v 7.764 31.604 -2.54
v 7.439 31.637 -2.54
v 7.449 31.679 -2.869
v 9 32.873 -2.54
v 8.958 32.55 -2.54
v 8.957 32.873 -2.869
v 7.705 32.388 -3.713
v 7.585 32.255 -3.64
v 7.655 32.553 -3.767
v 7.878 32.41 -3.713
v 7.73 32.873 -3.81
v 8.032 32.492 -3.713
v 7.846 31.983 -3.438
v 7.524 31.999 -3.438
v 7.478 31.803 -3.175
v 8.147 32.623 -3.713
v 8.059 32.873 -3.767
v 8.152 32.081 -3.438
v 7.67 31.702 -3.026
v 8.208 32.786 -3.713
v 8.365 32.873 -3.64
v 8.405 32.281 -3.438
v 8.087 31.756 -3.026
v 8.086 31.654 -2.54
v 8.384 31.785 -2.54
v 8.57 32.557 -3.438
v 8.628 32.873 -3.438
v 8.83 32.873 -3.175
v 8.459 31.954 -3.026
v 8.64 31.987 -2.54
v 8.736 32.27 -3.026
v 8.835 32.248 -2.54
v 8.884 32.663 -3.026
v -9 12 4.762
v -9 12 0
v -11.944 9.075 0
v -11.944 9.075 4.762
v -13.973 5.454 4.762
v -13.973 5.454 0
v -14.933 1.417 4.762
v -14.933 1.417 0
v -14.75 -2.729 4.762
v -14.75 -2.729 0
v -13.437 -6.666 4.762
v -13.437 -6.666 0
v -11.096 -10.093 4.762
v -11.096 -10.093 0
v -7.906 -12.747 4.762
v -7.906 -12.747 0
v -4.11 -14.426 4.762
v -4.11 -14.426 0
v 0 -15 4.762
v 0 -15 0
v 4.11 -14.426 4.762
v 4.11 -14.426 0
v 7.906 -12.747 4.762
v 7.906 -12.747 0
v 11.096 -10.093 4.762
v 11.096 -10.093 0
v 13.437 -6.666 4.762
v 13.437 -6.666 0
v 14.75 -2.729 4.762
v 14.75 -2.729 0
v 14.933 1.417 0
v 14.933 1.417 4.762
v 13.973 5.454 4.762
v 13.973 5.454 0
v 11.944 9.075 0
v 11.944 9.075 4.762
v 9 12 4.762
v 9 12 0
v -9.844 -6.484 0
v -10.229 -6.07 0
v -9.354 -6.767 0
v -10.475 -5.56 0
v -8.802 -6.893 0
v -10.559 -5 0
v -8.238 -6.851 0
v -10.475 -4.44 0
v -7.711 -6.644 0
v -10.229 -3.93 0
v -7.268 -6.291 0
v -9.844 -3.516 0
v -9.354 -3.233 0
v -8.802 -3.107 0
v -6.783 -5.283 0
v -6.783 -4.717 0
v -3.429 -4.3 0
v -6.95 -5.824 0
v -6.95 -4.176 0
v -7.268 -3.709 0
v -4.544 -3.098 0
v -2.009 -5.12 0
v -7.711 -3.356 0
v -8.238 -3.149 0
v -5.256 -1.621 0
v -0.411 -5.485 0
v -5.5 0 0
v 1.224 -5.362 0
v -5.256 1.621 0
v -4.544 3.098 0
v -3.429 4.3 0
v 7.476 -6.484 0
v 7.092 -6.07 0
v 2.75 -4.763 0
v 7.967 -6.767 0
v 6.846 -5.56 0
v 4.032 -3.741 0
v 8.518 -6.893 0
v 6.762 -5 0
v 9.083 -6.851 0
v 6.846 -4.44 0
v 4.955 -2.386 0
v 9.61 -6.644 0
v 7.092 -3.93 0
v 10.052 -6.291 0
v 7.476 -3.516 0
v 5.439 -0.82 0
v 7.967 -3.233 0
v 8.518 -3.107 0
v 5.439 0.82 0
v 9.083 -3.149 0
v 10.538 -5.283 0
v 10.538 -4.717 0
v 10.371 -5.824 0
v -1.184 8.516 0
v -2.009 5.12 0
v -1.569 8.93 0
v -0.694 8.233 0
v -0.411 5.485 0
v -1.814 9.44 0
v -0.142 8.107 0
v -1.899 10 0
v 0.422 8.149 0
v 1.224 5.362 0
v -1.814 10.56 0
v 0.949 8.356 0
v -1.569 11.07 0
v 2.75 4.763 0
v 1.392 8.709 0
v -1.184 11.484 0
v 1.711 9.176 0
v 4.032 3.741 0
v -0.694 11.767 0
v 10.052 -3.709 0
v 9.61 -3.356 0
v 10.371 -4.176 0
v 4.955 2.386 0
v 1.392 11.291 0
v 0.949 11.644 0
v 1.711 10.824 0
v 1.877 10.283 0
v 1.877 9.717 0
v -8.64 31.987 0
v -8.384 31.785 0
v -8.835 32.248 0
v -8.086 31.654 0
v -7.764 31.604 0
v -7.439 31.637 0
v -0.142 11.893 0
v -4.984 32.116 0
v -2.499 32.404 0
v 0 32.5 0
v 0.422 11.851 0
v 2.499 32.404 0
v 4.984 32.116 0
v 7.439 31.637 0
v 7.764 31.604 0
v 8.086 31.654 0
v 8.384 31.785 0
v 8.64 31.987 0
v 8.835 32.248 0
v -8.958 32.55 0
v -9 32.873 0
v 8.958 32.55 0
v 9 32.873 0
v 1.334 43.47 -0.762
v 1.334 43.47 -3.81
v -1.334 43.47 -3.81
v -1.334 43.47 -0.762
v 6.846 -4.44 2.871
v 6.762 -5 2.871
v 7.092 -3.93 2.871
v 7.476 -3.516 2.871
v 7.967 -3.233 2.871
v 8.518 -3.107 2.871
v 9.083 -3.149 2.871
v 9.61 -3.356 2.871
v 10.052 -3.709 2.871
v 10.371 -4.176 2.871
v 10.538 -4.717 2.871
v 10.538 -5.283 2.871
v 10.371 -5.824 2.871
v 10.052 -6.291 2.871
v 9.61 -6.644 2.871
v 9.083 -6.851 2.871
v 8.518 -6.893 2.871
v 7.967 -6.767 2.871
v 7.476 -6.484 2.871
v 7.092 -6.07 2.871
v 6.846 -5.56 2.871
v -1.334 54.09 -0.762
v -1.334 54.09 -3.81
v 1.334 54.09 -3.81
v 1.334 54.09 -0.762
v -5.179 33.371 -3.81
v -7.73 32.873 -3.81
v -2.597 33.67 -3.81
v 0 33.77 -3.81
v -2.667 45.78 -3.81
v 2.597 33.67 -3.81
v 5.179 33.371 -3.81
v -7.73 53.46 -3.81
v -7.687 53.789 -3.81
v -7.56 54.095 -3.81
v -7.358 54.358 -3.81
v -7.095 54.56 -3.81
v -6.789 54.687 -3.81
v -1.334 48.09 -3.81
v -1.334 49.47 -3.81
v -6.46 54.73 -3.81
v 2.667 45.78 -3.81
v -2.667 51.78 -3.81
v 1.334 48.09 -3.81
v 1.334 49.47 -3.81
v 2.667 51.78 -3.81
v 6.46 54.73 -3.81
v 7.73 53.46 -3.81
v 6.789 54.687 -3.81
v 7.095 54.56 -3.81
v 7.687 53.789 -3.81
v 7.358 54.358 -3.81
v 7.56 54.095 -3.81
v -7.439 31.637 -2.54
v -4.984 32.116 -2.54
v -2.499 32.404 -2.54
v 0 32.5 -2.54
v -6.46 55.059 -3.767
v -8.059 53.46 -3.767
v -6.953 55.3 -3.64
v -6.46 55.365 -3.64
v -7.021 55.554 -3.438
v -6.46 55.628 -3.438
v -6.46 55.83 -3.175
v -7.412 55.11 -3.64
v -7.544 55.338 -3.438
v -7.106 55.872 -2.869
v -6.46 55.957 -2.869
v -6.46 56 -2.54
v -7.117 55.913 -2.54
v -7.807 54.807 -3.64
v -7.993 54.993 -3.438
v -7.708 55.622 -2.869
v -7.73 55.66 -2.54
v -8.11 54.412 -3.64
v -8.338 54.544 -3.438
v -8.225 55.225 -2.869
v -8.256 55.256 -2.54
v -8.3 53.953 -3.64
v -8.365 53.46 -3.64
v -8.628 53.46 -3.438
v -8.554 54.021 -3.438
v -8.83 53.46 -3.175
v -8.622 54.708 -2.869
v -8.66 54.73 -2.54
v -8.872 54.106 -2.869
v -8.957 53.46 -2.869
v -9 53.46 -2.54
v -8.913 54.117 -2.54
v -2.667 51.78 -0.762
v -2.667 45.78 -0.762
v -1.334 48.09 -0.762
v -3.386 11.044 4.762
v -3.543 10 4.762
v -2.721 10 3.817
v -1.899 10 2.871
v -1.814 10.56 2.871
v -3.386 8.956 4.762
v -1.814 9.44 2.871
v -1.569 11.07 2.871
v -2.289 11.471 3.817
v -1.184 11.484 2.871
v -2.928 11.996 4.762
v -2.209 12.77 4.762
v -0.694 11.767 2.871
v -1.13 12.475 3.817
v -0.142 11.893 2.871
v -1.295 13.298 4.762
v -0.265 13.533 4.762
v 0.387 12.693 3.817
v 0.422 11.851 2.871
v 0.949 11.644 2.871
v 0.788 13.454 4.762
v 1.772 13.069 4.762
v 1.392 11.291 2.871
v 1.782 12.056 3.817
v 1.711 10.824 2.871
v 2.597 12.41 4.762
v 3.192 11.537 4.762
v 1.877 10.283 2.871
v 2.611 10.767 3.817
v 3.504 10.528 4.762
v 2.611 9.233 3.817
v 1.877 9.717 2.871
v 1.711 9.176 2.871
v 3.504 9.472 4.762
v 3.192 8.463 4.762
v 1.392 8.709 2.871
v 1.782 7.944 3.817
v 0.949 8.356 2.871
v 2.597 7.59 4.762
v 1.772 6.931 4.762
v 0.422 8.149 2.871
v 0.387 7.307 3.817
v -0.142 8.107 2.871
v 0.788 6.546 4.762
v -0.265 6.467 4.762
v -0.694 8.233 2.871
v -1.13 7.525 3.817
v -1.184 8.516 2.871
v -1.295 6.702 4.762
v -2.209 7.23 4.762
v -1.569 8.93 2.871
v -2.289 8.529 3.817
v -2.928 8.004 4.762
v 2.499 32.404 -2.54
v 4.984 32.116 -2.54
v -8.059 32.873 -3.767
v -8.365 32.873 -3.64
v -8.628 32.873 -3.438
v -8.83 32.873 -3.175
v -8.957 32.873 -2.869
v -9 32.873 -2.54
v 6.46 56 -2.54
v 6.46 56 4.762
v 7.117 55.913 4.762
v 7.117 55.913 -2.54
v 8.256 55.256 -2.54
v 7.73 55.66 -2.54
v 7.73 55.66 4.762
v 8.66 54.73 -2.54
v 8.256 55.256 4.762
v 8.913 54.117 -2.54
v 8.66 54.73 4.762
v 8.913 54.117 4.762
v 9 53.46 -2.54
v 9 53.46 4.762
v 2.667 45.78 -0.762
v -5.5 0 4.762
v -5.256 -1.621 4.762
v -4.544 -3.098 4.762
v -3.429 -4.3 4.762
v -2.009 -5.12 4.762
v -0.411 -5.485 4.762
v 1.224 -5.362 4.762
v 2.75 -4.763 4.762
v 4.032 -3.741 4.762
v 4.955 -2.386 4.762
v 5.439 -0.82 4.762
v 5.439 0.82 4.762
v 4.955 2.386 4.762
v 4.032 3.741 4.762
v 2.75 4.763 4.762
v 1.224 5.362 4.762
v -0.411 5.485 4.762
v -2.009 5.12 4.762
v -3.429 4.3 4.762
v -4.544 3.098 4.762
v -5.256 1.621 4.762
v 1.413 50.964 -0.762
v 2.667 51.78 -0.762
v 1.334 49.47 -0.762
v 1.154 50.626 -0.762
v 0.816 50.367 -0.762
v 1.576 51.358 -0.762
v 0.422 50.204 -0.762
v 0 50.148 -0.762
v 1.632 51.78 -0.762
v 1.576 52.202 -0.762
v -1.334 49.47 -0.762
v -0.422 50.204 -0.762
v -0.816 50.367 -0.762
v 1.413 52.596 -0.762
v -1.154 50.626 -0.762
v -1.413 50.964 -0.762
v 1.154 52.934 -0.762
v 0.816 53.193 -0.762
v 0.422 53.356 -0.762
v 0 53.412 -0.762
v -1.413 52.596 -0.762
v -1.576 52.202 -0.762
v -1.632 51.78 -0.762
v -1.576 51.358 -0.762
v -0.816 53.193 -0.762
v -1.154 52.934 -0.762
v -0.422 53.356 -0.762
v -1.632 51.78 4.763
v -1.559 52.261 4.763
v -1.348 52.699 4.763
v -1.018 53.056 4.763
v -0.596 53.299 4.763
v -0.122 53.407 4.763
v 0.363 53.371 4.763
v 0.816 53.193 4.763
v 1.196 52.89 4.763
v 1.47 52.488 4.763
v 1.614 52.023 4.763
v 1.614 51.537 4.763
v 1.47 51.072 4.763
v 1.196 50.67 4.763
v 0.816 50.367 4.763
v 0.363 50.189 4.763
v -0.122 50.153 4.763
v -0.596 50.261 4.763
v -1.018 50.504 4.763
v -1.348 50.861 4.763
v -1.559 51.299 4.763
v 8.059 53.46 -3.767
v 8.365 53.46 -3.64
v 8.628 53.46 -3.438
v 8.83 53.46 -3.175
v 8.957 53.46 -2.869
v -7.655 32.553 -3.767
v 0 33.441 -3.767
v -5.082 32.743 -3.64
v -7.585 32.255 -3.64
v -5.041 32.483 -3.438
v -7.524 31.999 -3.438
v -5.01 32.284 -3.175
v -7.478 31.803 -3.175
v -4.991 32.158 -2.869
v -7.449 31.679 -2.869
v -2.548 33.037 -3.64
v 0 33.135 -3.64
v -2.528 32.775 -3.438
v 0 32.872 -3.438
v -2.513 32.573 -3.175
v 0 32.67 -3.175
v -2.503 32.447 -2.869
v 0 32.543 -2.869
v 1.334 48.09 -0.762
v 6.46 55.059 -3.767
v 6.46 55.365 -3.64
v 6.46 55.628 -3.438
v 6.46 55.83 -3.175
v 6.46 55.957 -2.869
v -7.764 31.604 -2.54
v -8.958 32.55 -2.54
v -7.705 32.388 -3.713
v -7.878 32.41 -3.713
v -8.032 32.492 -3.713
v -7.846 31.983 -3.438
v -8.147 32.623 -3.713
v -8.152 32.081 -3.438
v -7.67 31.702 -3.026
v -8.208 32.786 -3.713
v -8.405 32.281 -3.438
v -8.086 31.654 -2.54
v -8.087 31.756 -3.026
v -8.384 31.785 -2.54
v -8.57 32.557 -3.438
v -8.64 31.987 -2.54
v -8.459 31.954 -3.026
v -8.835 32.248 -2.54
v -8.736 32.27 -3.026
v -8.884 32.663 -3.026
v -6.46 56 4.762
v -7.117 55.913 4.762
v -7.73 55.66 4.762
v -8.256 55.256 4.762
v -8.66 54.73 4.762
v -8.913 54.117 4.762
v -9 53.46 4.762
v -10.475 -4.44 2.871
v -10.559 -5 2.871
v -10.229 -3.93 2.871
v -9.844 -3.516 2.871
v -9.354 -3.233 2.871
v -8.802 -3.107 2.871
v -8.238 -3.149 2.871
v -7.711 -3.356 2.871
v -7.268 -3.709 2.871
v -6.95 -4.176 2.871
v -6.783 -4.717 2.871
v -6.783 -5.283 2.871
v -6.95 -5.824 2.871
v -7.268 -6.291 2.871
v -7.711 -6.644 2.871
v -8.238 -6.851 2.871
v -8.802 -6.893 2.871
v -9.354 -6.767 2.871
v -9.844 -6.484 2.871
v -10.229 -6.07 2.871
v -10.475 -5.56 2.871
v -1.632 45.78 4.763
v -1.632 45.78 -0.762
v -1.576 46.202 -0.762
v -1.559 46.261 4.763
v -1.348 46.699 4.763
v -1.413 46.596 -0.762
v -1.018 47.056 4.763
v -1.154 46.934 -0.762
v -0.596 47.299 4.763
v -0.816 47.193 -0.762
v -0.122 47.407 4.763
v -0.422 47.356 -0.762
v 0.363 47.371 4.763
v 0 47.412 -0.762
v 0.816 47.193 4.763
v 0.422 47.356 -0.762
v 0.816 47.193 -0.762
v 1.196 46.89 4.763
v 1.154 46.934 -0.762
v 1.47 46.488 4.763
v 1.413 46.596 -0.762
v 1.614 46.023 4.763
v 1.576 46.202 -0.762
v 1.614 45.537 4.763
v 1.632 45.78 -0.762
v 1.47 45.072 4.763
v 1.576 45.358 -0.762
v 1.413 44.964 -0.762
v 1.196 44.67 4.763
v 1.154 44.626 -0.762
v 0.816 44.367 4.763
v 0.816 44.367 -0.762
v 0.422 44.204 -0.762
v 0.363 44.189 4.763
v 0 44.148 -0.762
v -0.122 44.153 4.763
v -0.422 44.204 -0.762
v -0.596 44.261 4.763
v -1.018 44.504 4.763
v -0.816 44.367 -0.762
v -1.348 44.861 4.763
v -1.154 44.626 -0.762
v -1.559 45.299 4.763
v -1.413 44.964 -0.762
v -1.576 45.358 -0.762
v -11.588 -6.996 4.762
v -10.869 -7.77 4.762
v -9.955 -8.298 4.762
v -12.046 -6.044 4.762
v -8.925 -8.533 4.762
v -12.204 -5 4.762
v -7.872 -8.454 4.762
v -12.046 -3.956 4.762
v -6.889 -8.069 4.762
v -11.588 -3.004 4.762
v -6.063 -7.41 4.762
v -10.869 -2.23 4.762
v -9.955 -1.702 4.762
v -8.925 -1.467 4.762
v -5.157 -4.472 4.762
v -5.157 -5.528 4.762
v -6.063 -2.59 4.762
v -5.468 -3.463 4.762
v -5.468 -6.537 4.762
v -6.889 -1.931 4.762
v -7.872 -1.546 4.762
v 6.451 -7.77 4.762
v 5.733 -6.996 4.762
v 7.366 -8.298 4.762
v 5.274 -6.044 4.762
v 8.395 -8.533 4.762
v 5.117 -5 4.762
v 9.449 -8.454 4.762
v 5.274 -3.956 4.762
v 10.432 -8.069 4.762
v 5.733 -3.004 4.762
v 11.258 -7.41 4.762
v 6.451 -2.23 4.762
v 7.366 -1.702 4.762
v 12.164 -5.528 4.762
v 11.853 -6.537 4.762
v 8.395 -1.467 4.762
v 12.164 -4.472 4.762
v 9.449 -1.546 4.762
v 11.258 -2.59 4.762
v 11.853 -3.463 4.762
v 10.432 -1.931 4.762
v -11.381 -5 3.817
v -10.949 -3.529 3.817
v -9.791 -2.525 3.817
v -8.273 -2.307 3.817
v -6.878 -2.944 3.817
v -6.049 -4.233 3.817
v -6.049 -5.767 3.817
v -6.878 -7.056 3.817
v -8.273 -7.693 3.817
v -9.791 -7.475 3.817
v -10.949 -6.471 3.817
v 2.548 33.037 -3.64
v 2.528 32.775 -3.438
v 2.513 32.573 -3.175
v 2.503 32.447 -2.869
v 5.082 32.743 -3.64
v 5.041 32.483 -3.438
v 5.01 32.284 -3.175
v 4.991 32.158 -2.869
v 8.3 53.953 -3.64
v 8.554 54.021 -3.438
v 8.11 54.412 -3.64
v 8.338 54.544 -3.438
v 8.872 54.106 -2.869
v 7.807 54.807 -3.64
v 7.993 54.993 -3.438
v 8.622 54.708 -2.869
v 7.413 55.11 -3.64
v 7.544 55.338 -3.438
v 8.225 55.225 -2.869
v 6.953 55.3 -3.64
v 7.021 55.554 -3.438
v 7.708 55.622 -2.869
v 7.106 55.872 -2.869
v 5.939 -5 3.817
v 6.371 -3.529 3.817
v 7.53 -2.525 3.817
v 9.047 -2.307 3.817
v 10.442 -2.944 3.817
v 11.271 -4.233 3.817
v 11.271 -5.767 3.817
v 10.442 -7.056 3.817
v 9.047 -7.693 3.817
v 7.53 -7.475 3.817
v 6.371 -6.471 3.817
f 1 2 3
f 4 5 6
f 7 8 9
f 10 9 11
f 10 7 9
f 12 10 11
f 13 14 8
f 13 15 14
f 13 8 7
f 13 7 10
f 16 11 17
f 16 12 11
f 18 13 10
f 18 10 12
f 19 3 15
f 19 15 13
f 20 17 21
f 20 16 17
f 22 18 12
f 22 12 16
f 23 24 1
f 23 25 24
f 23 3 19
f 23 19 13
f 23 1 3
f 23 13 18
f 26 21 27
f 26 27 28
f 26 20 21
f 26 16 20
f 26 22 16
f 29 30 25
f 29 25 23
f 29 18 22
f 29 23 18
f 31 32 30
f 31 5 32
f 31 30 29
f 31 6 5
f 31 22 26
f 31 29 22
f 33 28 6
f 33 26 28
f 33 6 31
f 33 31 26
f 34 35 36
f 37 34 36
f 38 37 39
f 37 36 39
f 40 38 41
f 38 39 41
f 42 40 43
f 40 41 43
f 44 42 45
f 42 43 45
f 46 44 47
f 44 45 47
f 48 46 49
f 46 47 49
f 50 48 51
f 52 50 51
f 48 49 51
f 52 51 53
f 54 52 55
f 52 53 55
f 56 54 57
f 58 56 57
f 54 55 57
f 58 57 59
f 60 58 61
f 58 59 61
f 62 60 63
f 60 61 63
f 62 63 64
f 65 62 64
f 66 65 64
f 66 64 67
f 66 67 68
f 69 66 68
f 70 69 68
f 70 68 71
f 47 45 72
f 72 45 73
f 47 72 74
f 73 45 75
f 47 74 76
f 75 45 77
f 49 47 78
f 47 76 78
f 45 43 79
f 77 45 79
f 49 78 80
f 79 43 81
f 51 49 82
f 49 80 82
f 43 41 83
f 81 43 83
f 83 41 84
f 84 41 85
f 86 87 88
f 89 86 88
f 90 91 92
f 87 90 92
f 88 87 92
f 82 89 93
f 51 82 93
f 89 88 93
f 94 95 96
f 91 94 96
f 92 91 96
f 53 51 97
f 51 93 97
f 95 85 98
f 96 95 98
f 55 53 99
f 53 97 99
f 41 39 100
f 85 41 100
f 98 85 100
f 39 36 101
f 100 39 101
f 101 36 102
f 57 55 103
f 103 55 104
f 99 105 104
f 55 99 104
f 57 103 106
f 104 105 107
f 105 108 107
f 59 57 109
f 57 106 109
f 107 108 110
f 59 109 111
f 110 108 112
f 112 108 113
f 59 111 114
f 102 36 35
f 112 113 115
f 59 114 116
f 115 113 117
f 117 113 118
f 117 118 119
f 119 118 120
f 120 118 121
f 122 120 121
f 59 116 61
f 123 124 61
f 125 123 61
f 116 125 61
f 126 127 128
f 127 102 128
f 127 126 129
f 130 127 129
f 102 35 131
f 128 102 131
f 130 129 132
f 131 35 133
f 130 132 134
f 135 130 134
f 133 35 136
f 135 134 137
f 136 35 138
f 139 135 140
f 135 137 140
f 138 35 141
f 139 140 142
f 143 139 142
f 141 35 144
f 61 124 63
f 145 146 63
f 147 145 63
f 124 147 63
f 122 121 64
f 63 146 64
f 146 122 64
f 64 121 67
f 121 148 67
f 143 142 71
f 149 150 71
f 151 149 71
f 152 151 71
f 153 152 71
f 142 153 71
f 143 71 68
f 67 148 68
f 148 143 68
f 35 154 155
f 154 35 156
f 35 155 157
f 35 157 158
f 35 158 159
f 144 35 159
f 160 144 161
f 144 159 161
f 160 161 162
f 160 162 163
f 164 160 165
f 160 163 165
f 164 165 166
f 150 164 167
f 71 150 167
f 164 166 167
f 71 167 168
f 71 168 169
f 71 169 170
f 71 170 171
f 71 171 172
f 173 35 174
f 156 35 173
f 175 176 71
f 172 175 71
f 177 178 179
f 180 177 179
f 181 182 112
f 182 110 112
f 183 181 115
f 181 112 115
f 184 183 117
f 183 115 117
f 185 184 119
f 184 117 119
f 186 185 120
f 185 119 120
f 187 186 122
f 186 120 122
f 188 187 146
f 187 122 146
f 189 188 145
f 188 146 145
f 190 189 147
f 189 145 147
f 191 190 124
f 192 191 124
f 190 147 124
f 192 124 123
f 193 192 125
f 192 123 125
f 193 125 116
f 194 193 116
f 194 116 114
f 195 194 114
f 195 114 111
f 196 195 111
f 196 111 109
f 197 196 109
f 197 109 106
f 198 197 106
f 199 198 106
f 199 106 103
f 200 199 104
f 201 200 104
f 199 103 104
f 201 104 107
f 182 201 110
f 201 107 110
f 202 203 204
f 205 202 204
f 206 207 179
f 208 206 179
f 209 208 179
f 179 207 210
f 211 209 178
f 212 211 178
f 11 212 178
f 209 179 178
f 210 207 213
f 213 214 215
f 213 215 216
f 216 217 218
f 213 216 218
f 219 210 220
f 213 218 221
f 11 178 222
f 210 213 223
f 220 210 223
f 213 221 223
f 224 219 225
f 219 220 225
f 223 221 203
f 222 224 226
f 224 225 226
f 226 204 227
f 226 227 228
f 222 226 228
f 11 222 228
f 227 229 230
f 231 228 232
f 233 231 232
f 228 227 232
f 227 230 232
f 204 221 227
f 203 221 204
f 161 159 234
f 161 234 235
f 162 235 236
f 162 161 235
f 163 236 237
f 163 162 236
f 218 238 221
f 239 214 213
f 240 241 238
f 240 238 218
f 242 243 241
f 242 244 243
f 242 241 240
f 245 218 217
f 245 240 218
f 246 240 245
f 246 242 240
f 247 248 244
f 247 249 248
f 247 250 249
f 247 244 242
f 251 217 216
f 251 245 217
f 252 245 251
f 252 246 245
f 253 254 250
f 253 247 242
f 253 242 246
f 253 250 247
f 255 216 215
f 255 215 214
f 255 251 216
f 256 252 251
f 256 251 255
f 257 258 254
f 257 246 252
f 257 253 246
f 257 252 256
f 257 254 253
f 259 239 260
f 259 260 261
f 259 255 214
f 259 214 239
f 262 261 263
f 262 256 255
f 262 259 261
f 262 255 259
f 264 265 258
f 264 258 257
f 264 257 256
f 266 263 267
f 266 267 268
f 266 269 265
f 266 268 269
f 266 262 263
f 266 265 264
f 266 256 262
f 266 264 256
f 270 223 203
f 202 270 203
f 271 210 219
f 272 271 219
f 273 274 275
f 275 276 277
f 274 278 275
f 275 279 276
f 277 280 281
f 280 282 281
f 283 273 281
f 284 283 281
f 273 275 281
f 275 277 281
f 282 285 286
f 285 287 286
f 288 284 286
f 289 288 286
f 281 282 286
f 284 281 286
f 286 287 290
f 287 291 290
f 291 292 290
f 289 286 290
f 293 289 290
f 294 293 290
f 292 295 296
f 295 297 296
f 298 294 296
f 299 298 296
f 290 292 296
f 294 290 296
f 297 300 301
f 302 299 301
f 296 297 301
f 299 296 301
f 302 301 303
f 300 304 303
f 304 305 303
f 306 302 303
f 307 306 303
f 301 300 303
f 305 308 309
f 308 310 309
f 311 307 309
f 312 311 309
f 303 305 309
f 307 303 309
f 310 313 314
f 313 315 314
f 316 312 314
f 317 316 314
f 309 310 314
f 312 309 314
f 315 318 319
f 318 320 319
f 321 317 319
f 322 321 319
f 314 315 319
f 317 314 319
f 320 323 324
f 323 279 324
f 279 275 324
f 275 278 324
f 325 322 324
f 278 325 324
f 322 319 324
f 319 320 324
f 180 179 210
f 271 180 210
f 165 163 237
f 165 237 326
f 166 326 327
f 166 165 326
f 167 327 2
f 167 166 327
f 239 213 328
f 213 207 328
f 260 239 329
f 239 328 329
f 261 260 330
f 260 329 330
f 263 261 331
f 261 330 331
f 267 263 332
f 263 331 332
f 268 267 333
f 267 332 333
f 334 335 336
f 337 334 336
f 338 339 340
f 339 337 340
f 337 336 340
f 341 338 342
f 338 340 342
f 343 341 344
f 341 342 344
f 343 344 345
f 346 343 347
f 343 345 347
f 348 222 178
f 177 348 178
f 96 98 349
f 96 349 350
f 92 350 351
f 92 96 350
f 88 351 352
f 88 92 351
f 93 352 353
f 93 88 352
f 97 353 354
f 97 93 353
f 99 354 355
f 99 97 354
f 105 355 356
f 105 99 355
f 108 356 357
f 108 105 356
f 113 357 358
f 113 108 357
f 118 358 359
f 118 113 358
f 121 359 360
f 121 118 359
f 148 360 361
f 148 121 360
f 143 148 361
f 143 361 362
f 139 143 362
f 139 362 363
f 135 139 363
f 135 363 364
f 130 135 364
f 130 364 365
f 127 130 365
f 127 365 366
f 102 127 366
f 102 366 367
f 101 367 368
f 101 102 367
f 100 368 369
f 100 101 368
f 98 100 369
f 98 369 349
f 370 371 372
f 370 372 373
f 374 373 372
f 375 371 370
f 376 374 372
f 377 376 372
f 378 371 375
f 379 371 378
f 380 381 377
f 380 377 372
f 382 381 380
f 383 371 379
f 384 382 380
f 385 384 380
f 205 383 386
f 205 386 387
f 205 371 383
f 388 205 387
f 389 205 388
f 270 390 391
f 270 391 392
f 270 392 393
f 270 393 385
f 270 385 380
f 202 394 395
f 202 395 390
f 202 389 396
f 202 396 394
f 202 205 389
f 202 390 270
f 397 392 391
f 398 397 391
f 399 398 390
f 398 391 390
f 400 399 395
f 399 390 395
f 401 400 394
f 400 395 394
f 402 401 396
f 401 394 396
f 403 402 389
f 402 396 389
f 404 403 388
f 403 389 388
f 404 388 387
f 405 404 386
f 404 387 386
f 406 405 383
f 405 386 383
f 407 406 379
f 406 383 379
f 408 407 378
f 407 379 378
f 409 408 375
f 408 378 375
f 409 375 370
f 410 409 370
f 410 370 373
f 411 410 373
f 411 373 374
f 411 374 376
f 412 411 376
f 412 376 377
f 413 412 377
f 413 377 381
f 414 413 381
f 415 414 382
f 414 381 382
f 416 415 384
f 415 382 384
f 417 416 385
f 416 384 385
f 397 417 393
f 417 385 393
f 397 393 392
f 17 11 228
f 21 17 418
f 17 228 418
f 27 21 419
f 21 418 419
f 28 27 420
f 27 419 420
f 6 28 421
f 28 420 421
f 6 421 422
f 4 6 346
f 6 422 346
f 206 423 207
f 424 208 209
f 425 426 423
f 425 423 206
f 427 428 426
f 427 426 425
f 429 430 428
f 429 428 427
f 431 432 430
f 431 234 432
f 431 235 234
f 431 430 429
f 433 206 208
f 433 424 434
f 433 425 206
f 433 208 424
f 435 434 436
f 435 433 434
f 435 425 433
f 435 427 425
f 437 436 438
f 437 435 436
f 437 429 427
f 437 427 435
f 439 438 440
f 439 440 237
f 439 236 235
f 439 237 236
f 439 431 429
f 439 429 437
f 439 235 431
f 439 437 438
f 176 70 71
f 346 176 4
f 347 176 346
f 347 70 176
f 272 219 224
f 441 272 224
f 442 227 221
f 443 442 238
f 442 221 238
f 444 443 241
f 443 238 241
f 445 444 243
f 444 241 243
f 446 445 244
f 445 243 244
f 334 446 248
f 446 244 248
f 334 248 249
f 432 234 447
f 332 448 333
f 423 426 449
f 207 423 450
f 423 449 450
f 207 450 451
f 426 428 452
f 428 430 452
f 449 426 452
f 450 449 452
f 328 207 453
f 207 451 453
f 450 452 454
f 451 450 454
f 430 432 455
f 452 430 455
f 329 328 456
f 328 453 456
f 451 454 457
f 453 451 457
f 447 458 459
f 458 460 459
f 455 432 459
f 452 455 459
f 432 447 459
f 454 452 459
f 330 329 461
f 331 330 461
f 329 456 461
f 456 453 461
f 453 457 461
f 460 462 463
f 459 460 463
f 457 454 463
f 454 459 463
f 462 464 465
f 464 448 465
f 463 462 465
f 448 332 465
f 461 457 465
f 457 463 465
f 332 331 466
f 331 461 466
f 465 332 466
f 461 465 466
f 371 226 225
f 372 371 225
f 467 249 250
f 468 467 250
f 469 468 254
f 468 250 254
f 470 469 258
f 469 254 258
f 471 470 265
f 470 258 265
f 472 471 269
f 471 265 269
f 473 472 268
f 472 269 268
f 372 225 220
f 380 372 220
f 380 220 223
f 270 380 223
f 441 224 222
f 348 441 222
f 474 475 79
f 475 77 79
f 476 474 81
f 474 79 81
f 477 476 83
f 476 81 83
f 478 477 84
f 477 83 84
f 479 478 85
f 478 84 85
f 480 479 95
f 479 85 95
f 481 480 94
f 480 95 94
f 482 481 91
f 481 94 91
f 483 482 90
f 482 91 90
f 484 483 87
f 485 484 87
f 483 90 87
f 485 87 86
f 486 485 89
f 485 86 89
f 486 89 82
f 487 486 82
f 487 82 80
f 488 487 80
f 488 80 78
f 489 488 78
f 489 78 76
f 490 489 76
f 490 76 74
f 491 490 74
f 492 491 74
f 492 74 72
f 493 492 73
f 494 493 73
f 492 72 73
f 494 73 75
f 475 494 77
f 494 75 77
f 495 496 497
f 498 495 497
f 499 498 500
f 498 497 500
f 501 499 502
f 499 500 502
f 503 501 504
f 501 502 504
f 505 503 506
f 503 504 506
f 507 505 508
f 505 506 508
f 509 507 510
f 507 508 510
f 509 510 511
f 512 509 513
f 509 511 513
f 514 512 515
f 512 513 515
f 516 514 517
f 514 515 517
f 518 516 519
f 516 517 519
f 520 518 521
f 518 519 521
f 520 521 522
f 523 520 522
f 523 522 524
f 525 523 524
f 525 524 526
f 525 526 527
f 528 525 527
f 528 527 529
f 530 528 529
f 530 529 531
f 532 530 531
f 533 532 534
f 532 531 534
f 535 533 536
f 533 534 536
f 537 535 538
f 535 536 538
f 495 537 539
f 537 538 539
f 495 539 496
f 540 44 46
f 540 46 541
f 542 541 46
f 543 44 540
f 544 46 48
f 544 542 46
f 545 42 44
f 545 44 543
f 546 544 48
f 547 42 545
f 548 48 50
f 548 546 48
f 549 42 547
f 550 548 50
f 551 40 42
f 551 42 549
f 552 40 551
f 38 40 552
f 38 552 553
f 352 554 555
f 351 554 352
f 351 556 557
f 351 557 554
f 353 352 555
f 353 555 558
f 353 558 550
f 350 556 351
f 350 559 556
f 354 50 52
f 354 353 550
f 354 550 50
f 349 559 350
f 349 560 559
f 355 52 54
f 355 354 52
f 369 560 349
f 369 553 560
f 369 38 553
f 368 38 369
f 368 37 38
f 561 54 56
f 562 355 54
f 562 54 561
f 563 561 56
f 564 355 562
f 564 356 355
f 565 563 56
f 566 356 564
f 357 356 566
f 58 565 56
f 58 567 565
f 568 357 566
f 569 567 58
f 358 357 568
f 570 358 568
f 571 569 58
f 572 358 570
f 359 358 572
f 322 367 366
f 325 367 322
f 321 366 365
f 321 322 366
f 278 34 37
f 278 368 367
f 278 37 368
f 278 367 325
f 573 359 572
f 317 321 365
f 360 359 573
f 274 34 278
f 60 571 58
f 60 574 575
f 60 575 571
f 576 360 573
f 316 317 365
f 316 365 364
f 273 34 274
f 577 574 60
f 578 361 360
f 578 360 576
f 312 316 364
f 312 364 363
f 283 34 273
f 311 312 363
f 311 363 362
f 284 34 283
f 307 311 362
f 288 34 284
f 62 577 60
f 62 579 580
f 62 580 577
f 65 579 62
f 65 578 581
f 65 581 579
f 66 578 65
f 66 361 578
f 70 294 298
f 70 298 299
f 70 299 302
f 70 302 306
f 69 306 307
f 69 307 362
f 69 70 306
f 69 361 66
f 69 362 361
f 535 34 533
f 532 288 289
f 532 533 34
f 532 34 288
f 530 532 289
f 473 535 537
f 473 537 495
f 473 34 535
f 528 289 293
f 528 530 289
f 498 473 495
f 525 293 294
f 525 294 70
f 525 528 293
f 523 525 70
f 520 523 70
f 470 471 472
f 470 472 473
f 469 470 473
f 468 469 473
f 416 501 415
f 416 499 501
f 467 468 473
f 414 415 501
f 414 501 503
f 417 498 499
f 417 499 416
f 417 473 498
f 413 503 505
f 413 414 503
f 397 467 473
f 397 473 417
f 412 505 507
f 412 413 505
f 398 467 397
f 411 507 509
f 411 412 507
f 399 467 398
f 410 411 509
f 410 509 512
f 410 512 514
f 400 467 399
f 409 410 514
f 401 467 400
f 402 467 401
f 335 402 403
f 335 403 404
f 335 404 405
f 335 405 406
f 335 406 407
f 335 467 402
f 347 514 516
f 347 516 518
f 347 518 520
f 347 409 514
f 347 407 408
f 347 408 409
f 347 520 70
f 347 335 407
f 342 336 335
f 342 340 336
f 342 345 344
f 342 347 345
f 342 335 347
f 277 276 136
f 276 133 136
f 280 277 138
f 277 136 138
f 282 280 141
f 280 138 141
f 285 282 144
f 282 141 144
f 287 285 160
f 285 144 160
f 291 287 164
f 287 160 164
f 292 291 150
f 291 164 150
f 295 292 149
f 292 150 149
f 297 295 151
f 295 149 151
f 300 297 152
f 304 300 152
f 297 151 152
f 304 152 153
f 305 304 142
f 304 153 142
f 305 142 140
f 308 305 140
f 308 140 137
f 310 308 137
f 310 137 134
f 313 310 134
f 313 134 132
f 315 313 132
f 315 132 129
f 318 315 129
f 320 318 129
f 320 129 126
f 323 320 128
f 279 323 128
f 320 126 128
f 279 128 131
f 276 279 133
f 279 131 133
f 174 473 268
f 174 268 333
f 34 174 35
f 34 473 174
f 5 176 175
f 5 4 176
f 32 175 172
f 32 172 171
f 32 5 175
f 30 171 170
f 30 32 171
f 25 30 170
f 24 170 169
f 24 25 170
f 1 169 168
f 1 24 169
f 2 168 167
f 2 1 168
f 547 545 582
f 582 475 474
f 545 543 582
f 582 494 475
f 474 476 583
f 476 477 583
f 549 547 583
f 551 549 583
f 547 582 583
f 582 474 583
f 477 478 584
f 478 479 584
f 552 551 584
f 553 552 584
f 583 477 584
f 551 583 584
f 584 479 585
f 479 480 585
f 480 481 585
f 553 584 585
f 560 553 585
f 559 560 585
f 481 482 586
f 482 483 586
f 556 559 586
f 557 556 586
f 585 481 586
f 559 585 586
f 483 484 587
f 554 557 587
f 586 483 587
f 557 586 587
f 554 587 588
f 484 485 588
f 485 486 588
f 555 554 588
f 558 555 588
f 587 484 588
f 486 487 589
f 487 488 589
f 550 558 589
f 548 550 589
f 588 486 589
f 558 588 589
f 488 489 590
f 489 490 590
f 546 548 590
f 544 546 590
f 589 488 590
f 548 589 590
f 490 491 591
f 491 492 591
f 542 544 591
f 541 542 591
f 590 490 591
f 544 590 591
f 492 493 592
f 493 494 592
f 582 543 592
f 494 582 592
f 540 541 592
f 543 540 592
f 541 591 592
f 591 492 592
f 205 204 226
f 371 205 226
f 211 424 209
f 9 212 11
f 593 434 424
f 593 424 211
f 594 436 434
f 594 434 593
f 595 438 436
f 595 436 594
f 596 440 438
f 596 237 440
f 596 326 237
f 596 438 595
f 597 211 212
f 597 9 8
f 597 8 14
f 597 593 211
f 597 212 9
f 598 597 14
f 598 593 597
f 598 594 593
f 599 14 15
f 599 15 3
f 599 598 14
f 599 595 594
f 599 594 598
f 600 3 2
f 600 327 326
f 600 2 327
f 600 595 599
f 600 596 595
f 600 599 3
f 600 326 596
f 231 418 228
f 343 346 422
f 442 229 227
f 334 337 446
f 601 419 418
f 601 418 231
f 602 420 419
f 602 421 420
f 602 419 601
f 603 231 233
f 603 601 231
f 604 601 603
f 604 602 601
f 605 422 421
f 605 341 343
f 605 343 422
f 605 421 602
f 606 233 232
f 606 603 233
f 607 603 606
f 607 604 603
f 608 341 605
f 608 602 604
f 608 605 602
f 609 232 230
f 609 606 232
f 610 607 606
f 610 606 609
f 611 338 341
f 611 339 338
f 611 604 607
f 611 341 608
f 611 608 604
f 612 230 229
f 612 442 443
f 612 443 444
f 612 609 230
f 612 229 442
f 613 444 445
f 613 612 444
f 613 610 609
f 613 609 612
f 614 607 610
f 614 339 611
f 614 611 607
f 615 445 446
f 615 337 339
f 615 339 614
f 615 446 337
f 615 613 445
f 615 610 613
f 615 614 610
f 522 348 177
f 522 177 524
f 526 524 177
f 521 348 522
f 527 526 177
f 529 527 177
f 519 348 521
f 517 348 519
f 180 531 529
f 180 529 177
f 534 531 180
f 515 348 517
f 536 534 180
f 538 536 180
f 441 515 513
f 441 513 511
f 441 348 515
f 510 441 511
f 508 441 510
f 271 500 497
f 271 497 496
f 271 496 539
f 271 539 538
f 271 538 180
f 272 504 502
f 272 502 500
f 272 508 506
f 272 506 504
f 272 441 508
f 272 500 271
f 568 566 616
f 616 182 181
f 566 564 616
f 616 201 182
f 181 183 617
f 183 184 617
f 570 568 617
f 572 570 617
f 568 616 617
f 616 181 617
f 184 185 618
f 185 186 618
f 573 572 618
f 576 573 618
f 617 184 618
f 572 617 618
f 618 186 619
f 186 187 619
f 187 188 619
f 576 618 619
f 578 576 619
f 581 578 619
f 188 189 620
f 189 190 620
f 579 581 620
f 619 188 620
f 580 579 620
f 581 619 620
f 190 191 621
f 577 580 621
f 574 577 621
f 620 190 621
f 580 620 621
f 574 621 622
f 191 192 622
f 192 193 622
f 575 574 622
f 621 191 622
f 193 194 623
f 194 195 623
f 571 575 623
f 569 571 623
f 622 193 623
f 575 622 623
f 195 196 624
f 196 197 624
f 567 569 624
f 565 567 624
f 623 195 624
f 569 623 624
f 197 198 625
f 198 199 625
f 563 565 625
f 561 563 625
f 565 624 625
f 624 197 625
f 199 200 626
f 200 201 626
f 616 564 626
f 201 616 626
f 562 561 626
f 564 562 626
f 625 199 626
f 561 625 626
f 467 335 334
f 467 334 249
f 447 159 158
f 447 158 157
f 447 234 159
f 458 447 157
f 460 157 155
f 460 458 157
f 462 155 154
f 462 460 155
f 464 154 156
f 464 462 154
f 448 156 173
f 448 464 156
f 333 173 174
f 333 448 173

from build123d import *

# Parameters (mm, degrees)
SKETCH1_R                                      = 5.5
BODY_DEPTH                                     = 4.7625
HEX_NUTYFOOT_DEPTH                             = 3.81
F_4_CLEARANCE_HOLE1_D                          = 3.2639
SKETCH7_R                                      = 1.63195
HEX_NUT_RECESS_DEPTH                           = 3.048
CSK_FOR_6_FLAT_HEAD_MACHINE_SCREW1_D           = 3.7973
CSK_FOR_6_FLAT_HEAD_MACHINE_SCREW1_CSINK_D     = 7.0866
CSK_FOR_6_FLAT_HEAD_MACHINE_SCREW1_CSINK_ANGLE = 82
FILLET1_R                                      = 2.54
FILLET2_R                                      = 1.27


with BuildPart() as part:
    # Sketch1 → Body (new body)
    with BuildSketch(Plane.XY):
        with BuildLine():
            ThreePointArc((-9, 12), (0, -15), (9, 12))
            Line((9, 12), (9, 56))
            Line((9, 56), (-9, 56))
            Line((-9, 56), (-9, 12))
        make_face()
        Circle(SKETCH1_R, mode=Mode.SUBTRACT)
    extrude(amount=BODY_DEPTH)

    # Sketch1<3> → Hex NutyFoot (add)
    with BuildSketch(Plane.XY):
        with BuildLine():
            ThreePointArc((-9, 31.228992939), (0, 32.5), (9, 31.228992939))
            Line((9, 31.228992939), (9, 56))
            Line((9, 56), (-9, 56))
            Line((-9, 56), (-9, 31.228992939))
        make_face()
    extrude(amount=-HEX_NUTYFOOT_DEPTH)

    # #4 Clearance Hole1 (through all)
    with Locations(Plane(origin=(0, 45.78, 4.7625), x_dir=(1, 0, 0), z_dir=(0, 0, 1))):
        with Locations((0, 0), (0, 6)):
            Hole(F_4_CLEARANCE_HOLE1_D / 2)

    # Sketch7 → Hex Nut Recess (cut)
    # profile 1 of 2: a face of its own
    with BuildSketch(Plane(origin=(0, 0, -3.81), x_dir=(-1, 0, 0), z_dir=(0, 0, -1))):
        Polygon((2.667, 45.78), (1.3335, 48.089689752), (-1.3335, 48.089689752), (-2.667, 45.78), (-1.3335, 43.470310248), (1.3335, 43.470310248), align=None)
        with Locations((0, 45.78)):
            Circle(SKETCH7_R, mode=Mode.SUBTRACT)
    # profile 2 of 2: a face of its own
    with BuildSketch(Plane(origin=(0, 0, -3.81), x_dir=(-1, 0, 0), z_dir=(0, 0, -1))):
        Polygon((2.667, 51.78), (1.3335, 54.089689752), (-1.3335, 54.089689752), (-2.667, 51.78), (-1.3335, 49.470310248), (1.3335, 49.470310248), align=None)
        with Locations((0, 51.78)):
            Circle(SKETCH7_R, mode=Mode.SUBTRACT)
    extrude(amount=-HEX_NUT_RECESS_DEPTH, mode=Mode.SUBTRACT)

    # CSK for #6 Flat Head Machine Screw1 (through all)
    with Locations(Plane(origin=(0, 10, 4.7625), x_dir=(1, 0, 0), z_dir=(0, 0, 1))):
        with Locations((0, 0), (8.660254038, -15), (-8.660254038, -15)):
            CounterSinkHole(CSK_FOR_6_FLAT_HEAD_MACHINE_SCREW1_D / 2, CSK_FOR_6_FLAT_HEAD_MACHINE_SCREW1_CSINK_D / 2, counter_sink_angle=CSK_FOR_6_FLAT_HEAD_MACHINE_SCREW1_CSINK_ANGLE)

    # Fillet1
    fillet1_edges = [part.edges().sort_by_distance(p)[0] for p in [
        (-9, 56, 0.47625),
        (9, 56, 0.47625),
    ]]
    fillet(fillet1_edges, radius=FILLET1_R)

    # Fillet2
    fillet2_edges = [part.edges().sort_by_distance(p)[0] for p in [
        (-9, 42.34449647, -3.81),
        (-8.256051224, 55.256051224, -3.81),
        (0, 56, -3.81),
        (8.256051224, 55.256051224, -3.81),
        (-9, 31.228992939, -1.905),
        (9, 31.228992939, -1.905),
        (0, 32.5, -3.81),
        (9, 42.34449647, -3.81),
    ]]
    fillet(fillet2_edges, radius=FILLET2_R)


solid = part.part
